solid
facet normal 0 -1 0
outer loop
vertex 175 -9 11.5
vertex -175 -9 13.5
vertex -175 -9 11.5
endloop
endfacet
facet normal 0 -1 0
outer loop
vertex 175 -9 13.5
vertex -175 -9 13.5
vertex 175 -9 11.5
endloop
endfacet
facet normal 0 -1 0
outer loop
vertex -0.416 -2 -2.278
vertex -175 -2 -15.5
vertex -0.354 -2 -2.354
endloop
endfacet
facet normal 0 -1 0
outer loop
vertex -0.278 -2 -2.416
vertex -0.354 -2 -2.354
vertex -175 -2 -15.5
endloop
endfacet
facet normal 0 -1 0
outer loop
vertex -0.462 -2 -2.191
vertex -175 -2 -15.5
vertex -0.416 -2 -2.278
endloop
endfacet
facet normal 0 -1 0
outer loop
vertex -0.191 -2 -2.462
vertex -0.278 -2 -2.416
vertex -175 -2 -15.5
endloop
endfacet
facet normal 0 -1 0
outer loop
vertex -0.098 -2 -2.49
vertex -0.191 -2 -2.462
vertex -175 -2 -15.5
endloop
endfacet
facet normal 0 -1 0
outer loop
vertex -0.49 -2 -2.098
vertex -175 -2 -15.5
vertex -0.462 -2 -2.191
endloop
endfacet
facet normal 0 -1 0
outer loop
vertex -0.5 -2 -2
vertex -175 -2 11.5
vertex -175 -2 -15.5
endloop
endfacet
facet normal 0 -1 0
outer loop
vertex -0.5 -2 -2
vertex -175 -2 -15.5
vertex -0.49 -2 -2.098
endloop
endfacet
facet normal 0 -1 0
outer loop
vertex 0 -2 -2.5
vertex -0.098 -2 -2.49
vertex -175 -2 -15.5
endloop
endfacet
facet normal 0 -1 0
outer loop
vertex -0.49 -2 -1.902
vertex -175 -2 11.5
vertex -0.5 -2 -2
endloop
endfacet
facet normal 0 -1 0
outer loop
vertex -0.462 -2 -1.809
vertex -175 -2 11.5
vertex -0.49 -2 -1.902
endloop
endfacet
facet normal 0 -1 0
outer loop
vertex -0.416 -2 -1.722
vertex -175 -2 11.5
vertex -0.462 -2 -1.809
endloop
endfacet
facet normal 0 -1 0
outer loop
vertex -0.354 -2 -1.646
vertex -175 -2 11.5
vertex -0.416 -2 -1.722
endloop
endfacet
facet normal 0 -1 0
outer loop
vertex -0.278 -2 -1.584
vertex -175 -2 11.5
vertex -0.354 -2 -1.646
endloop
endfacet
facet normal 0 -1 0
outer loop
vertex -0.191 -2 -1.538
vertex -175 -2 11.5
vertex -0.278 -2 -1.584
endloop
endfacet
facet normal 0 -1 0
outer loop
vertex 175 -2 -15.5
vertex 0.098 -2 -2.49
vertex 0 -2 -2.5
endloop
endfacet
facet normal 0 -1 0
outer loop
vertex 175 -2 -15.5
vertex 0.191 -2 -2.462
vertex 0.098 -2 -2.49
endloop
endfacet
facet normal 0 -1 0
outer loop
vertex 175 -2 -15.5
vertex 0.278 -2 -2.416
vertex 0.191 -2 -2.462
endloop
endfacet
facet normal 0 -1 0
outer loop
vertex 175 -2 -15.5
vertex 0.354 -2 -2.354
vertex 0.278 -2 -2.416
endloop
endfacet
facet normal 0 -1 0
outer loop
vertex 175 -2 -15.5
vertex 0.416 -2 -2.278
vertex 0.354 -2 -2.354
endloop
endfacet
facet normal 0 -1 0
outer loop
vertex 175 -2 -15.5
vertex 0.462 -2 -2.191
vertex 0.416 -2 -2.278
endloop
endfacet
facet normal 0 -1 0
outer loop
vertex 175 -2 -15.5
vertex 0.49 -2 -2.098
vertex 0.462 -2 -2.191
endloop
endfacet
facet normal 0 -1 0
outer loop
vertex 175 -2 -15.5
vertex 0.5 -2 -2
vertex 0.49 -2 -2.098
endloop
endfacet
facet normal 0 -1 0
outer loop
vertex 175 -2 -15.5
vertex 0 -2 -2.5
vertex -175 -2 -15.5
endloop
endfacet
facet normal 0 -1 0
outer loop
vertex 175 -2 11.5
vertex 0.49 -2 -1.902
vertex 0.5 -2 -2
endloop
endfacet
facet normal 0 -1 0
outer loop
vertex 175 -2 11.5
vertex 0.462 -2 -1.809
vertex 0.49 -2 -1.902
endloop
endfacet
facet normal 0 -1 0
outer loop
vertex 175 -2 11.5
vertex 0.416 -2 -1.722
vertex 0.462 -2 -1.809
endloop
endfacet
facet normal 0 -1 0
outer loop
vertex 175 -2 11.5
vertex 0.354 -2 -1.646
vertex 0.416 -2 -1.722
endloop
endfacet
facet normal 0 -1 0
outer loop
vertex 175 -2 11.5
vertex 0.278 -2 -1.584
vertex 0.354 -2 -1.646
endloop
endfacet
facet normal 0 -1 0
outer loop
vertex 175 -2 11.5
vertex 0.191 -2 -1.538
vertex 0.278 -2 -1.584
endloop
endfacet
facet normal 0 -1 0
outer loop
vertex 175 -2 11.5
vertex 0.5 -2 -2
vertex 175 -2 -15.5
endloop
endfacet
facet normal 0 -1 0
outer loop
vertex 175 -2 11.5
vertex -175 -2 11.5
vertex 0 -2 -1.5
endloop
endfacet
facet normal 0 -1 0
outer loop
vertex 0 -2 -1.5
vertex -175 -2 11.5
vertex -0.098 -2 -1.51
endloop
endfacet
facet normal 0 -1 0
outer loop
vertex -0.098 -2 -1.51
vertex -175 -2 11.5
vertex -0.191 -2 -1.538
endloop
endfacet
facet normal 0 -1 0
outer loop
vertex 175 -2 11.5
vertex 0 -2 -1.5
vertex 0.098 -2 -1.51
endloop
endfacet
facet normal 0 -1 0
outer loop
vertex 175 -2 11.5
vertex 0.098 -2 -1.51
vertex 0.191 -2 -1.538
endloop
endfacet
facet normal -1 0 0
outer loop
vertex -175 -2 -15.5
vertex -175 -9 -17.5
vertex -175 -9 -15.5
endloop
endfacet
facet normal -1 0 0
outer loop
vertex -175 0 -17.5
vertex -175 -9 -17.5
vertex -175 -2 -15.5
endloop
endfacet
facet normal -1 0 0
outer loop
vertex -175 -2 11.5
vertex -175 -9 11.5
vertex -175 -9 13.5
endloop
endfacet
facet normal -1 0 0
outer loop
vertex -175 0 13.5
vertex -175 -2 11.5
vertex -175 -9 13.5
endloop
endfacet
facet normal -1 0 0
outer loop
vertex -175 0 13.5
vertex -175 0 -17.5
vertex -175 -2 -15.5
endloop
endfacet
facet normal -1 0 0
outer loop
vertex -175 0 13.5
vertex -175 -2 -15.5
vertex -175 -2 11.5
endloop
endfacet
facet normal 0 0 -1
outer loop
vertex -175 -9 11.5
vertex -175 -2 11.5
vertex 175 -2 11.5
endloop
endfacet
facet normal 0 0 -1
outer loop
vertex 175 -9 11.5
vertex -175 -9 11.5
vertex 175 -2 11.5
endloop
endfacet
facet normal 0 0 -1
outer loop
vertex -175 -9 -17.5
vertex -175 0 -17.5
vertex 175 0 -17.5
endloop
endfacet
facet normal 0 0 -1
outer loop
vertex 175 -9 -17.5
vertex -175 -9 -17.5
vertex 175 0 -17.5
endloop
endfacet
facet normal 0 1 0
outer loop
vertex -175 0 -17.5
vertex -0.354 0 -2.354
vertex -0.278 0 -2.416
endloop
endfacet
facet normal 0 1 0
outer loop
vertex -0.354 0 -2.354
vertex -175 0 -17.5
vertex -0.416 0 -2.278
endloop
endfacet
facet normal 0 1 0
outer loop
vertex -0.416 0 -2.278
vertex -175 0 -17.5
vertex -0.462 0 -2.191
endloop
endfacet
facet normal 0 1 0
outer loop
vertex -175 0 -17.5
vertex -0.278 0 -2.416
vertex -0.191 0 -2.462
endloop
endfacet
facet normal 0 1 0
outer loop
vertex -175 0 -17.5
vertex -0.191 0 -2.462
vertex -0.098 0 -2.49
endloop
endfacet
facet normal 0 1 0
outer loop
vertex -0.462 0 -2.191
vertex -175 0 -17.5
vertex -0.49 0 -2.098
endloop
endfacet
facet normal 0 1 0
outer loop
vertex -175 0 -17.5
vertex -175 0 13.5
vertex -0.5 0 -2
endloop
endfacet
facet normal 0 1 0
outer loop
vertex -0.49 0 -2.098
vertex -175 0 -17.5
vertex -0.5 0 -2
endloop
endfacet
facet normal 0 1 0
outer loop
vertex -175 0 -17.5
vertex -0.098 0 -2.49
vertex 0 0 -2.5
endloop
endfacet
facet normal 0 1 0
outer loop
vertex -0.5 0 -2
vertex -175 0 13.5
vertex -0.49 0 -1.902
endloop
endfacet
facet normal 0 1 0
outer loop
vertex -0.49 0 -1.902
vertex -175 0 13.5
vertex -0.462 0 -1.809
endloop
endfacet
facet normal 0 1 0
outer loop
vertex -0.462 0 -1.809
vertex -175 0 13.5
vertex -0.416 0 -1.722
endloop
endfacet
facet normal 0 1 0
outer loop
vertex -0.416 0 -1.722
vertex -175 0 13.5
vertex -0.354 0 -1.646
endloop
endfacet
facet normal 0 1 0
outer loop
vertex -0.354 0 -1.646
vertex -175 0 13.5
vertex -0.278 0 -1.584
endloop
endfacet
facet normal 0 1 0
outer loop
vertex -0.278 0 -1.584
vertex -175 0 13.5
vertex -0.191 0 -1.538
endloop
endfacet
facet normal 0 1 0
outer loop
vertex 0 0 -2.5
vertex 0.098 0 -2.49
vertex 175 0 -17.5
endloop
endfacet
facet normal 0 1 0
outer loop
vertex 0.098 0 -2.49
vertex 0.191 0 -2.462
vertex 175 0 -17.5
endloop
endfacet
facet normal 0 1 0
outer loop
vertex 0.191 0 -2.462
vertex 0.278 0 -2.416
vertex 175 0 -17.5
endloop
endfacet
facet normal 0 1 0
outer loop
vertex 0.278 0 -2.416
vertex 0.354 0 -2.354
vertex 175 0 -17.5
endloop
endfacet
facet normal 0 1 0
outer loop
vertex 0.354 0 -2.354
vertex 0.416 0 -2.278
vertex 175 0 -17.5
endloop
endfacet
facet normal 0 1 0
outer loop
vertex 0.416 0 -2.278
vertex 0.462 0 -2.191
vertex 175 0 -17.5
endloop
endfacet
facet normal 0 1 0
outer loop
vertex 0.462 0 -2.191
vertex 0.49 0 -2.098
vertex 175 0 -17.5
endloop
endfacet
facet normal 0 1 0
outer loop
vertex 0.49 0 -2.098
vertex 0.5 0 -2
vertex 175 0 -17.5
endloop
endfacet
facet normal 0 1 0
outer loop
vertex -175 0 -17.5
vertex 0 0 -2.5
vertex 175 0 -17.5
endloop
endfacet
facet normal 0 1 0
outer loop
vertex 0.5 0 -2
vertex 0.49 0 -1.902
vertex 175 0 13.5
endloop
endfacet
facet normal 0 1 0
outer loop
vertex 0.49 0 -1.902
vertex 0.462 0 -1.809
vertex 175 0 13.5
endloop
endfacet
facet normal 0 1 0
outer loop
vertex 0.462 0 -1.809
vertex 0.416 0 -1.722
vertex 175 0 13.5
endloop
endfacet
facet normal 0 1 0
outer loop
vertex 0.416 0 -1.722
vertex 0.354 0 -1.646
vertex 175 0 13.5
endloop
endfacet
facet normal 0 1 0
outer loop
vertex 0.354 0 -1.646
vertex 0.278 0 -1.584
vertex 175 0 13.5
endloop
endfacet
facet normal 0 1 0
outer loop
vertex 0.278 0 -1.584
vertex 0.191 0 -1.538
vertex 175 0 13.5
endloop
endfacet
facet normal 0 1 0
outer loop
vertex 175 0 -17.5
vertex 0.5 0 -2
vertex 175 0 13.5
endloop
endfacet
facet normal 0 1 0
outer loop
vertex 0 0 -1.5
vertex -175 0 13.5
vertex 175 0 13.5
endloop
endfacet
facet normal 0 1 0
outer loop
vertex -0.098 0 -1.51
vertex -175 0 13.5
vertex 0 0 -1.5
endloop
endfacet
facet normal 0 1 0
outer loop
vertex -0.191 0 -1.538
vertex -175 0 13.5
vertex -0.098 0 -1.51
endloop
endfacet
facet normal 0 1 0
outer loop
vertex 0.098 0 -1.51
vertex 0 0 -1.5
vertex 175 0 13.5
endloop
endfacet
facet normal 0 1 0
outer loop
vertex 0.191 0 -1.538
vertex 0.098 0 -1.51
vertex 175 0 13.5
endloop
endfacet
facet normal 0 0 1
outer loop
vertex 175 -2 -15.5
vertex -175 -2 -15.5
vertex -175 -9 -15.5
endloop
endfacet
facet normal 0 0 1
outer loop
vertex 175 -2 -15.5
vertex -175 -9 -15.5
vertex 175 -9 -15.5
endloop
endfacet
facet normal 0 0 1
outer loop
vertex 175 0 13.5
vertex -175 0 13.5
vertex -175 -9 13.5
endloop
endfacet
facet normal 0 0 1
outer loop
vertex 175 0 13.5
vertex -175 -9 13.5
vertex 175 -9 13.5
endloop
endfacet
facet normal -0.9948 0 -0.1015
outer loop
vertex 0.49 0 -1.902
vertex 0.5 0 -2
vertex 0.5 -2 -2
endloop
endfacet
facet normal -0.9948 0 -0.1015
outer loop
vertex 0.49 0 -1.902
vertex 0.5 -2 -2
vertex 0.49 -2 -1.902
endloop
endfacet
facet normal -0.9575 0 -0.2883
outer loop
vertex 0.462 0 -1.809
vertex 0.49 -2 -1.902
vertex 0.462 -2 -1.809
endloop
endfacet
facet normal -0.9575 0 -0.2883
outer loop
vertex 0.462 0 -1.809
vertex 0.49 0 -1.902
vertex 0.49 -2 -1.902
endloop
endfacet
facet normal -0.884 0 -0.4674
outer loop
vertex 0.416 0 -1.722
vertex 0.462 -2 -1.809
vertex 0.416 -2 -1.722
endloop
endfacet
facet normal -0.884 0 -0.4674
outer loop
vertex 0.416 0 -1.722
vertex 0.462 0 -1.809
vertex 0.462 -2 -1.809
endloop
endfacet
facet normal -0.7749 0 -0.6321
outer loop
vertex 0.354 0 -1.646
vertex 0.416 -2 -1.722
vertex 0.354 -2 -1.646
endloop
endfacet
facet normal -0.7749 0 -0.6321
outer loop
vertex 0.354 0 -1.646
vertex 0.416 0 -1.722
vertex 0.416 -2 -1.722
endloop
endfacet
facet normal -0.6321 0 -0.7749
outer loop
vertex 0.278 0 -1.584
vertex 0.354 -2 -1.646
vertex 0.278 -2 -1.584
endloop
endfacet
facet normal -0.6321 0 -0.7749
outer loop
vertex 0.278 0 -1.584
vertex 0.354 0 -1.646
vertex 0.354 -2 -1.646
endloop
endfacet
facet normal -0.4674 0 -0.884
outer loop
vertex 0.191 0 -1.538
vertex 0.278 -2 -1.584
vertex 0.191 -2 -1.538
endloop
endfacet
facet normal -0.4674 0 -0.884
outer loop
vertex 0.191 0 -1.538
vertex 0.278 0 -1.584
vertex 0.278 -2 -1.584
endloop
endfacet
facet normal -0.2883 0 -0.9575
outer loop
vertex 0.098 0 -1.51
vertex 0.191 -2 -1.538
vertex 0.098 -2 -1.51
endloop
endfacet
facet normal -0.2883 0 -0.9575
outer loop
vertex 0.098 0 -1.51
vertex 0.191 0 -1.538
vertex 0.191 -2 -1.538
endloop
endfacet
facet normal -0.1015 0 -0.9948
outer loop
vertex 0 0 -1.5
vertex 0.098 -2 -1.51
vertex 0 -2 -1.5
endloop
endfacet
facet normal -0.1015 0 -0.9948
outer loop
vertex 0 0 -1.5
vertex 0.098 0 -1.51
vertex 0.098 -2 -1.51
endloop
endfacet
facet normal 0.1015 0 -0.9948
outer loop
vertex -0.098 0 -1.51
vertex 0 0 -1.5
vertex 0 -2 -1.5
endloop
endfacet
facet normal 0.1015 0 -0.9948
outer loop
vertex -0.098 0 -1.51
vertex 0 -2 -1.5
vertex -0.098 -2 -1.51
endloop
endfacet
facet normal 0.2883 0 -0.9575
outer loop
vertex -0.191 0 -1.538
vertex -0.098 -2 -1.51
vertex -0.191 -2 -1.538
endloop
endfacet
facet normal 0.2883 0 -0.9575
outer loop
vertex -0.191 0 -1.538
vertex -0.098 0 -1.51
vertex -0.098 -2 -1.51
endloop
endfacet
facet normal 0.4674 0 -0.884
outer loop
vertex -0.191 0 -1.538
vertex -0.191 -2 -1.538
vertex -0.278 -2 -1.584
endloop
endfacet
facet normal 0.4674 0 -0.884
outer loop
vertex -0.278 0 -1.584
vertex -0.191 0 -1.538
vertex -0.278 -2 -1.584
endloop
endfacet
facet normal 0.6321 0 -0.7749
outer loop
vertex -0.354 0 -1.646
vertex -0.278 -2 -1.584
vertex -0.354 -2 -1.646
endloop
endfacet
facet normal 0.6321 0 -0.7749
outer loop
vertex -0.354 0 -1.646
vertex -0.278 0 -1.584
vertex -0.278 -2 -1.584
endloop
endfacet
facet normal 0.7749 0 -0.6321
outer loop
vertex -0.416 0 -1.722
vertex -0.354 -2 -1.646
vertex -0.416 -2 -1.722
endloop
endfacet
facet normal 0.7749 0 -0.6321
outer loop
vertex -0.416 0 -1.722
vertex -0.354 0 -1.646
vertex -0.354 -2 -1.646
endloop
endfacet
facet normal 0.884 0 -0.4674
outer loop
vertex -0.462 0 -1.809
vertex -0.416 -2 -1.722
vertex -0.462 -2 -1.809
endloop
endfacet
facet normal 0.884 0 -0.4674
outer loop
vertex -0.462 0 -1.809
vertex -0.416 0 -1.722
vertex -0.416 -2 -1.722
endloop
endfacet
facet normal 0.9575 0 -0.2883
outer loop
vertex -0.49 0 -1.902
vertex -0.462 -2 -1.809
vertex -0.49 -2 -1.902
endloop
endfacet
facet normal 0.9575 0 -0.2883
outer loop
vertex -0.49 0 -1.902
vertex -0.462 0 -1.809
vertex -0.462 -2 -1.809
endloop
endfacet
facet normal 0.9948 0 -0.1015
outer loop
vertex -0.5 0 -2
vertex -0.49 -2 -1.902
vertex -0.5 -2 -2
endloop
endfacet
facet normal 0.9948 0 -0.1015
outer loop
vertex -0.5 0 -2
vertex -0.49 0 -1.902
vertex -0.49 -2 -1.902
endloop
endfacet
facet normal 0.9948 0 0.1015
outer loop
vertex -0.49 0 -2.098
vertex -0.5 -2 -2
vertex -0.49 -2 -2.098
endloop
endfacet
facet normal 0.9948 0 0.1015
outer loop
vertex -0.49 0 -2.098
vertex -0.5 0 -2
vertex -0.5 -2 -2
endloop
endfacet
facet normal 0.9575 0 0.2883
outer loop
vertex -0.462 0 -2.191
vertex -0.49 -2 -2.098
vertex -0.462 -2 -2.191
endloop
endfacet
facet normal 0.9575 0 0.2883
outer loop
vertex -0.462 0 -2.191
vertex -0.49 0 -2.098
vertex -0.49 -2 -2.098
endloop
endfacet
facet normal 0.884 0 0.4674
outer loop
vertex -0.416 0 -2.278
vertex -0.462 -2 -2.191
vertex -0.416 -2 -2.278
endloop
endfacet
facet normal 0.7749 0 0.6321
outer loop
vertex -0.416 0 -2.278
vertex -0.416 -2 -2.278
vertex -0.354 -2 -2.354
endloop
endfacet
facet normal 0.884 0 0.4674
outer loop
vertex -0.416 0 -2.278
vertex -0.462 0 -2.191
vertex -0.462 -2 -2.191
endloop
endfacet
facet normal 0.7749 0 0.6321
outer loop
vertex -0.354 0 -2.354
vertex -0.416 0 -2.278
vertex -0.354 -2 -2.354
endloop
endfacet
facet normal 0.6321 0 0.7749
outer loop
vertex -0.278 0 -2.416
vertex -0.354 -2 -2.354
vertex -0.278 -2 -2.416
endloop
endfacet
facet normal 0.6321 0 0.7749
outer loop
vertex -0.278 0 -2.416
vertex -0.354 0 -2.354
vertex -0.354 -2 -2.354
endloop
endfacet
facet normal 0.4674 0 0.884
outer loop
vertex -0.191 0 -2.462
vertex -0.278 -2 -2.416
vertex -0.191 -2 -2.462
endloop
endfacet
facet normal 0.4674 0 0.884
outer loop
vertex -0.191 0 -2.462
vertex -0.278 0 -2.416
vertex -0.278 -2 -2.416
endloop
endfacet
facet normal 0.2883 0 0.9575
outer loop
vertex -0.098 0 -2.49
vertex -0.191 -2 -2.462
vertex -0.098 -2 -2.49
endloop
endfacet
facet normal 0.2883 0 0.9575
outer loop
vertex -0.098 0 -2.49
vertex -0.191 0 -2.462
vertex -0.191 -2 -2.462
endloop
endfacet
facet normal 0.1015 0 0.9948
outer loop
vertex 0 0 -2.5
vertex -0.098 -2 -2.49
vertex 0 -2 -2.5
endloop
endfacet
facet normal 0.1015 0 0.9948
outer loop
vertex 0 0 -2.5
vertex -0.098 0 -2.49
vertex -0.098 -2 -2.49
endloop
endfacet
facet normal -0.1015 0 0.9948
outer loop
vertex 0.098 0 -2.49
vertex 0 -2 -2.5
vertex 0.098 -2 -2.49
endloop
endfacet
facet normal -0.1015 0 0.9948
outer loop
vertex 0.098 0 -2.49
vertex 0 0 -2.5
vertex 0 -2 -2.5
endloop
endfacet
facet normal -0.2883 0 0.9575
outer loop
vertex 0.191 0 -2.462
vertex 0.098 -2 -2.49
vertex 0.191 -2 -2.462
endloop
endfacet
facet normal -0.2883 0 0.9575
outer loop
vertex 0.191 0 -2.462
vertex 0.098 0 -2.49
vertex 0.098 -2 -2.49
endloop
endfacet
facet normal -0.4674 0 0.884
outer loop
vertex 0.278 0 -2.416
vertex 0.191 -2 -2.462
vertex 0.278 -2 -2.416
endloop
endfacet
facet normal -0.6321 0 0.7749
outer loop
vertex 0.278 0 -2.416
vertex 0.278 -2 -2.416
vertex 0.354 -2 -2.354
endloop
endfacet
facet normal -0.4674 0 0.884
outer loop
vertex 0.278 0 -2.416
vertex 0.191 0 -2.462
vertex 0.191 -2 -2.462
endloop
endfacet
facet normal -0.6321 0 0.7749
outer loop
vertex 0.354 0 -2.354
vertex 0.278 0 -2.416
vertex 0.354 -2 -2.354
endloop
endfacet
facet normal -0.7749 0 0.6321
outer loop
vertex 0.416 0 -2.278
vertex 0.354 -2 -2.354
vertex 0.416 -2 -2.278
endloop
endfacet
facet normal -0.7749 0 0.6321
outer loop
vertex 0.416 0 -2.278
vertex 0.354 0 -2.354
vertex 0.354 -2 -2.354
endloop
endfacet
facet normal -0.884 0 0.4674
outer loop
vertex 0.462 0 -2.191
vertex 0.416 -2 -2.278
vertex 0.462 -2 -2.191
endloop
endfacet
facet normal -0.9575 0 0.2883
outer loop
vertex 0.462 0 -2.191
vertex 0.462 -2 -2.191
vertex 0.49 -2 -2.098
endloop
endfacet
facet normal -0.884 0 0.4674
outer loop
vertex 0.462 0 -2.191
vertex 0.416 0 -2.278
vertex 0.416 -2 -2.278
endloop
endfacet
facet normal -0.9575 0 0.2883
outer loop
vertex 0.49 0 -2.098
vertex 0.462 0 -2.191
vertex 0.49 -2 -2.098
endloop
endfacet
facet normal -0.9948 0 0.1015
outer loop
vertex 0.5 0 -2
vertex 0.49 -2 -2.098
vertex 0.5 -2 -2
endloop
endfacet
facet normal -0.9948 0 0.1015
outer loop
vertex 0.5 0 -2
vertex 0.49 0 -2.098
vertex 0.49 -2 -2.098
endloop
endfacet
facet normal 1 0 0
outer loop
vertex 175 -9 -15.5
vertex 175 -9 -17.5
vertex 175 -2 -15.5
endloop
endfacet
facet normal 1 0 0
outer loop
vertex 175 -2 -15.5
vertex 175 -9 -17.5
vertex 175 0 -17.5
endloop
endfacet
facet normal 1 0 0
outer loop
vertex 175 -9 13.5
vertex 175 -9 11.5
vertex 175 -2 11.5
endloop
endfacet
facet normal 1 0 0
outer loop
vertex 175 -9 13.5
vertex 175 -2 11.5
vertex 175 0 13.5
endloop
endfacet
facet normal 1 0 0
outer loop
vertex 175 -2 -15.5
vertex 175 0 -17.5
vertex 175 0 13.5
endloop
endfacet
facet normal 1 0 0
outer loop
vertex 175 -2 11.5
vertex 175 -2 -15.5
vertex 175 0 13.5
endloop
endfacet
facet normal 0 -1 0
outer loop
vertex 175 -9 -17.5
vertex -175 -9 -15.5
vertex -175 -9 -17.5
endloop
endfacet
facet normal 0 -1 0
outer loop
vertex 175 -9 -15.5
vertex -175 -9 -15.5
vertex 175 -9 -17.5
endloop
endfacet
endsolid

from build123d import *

# Parameters (mm, degrees)
F0_R     = 0.5
F1_DEPTH = 2
F2_W     = 350
F2_H     = 2
F3_DEPTH = 7
F6_DEPTH = 2


with BuildPart() as f1:
    # F0 (on Front) → F1 (new body)
    with BuildSketch(Plane.XZ):
        Polygon((175, 13.5), (-175, 13.5), (-175, 11.5), (-175, -15.5), (-175, -17.5), (175, -17.5), (175, -15.5), (175, 11.5), align=None)
        with Locations((0, -2)):
            Circle(F0_R, mode=Mode.SUBTRACT)
    extrude(amount=F1_DEPTH)

    # F2 (on face) → F3 (join)
    with BuildSketch(Plane.XZ.offset(2)):
        with Locations((0, 12.5)):
            Rectangle(F2_W, F2_H)
        with Locations((0, -16.5)):
            Rectangle(F2_W, F2_H)
    extrude(amount=F3_DEPTH)

    # F0 (on Front) → F6 (cut)
    with BuildSketch(Plane.XZ):
        Polygon((175, 13.5), (-175, 13.5), (-175, 11.5), (-175, -15.5), (-175, -17.5), (175, -17.5), (175, -15.5), (175, 11.5), align=None)
        with Locations((0, -2)):
            Circle(F0_R, mode=Mode.SUBTRACT)
    extrude(amount=-F6_DEPTH, mode=Mode.SUBTRACT)


with BuildPart() as f4_1:
    # F4: copy of F1
    add(f1.part)


solid = f1.part
